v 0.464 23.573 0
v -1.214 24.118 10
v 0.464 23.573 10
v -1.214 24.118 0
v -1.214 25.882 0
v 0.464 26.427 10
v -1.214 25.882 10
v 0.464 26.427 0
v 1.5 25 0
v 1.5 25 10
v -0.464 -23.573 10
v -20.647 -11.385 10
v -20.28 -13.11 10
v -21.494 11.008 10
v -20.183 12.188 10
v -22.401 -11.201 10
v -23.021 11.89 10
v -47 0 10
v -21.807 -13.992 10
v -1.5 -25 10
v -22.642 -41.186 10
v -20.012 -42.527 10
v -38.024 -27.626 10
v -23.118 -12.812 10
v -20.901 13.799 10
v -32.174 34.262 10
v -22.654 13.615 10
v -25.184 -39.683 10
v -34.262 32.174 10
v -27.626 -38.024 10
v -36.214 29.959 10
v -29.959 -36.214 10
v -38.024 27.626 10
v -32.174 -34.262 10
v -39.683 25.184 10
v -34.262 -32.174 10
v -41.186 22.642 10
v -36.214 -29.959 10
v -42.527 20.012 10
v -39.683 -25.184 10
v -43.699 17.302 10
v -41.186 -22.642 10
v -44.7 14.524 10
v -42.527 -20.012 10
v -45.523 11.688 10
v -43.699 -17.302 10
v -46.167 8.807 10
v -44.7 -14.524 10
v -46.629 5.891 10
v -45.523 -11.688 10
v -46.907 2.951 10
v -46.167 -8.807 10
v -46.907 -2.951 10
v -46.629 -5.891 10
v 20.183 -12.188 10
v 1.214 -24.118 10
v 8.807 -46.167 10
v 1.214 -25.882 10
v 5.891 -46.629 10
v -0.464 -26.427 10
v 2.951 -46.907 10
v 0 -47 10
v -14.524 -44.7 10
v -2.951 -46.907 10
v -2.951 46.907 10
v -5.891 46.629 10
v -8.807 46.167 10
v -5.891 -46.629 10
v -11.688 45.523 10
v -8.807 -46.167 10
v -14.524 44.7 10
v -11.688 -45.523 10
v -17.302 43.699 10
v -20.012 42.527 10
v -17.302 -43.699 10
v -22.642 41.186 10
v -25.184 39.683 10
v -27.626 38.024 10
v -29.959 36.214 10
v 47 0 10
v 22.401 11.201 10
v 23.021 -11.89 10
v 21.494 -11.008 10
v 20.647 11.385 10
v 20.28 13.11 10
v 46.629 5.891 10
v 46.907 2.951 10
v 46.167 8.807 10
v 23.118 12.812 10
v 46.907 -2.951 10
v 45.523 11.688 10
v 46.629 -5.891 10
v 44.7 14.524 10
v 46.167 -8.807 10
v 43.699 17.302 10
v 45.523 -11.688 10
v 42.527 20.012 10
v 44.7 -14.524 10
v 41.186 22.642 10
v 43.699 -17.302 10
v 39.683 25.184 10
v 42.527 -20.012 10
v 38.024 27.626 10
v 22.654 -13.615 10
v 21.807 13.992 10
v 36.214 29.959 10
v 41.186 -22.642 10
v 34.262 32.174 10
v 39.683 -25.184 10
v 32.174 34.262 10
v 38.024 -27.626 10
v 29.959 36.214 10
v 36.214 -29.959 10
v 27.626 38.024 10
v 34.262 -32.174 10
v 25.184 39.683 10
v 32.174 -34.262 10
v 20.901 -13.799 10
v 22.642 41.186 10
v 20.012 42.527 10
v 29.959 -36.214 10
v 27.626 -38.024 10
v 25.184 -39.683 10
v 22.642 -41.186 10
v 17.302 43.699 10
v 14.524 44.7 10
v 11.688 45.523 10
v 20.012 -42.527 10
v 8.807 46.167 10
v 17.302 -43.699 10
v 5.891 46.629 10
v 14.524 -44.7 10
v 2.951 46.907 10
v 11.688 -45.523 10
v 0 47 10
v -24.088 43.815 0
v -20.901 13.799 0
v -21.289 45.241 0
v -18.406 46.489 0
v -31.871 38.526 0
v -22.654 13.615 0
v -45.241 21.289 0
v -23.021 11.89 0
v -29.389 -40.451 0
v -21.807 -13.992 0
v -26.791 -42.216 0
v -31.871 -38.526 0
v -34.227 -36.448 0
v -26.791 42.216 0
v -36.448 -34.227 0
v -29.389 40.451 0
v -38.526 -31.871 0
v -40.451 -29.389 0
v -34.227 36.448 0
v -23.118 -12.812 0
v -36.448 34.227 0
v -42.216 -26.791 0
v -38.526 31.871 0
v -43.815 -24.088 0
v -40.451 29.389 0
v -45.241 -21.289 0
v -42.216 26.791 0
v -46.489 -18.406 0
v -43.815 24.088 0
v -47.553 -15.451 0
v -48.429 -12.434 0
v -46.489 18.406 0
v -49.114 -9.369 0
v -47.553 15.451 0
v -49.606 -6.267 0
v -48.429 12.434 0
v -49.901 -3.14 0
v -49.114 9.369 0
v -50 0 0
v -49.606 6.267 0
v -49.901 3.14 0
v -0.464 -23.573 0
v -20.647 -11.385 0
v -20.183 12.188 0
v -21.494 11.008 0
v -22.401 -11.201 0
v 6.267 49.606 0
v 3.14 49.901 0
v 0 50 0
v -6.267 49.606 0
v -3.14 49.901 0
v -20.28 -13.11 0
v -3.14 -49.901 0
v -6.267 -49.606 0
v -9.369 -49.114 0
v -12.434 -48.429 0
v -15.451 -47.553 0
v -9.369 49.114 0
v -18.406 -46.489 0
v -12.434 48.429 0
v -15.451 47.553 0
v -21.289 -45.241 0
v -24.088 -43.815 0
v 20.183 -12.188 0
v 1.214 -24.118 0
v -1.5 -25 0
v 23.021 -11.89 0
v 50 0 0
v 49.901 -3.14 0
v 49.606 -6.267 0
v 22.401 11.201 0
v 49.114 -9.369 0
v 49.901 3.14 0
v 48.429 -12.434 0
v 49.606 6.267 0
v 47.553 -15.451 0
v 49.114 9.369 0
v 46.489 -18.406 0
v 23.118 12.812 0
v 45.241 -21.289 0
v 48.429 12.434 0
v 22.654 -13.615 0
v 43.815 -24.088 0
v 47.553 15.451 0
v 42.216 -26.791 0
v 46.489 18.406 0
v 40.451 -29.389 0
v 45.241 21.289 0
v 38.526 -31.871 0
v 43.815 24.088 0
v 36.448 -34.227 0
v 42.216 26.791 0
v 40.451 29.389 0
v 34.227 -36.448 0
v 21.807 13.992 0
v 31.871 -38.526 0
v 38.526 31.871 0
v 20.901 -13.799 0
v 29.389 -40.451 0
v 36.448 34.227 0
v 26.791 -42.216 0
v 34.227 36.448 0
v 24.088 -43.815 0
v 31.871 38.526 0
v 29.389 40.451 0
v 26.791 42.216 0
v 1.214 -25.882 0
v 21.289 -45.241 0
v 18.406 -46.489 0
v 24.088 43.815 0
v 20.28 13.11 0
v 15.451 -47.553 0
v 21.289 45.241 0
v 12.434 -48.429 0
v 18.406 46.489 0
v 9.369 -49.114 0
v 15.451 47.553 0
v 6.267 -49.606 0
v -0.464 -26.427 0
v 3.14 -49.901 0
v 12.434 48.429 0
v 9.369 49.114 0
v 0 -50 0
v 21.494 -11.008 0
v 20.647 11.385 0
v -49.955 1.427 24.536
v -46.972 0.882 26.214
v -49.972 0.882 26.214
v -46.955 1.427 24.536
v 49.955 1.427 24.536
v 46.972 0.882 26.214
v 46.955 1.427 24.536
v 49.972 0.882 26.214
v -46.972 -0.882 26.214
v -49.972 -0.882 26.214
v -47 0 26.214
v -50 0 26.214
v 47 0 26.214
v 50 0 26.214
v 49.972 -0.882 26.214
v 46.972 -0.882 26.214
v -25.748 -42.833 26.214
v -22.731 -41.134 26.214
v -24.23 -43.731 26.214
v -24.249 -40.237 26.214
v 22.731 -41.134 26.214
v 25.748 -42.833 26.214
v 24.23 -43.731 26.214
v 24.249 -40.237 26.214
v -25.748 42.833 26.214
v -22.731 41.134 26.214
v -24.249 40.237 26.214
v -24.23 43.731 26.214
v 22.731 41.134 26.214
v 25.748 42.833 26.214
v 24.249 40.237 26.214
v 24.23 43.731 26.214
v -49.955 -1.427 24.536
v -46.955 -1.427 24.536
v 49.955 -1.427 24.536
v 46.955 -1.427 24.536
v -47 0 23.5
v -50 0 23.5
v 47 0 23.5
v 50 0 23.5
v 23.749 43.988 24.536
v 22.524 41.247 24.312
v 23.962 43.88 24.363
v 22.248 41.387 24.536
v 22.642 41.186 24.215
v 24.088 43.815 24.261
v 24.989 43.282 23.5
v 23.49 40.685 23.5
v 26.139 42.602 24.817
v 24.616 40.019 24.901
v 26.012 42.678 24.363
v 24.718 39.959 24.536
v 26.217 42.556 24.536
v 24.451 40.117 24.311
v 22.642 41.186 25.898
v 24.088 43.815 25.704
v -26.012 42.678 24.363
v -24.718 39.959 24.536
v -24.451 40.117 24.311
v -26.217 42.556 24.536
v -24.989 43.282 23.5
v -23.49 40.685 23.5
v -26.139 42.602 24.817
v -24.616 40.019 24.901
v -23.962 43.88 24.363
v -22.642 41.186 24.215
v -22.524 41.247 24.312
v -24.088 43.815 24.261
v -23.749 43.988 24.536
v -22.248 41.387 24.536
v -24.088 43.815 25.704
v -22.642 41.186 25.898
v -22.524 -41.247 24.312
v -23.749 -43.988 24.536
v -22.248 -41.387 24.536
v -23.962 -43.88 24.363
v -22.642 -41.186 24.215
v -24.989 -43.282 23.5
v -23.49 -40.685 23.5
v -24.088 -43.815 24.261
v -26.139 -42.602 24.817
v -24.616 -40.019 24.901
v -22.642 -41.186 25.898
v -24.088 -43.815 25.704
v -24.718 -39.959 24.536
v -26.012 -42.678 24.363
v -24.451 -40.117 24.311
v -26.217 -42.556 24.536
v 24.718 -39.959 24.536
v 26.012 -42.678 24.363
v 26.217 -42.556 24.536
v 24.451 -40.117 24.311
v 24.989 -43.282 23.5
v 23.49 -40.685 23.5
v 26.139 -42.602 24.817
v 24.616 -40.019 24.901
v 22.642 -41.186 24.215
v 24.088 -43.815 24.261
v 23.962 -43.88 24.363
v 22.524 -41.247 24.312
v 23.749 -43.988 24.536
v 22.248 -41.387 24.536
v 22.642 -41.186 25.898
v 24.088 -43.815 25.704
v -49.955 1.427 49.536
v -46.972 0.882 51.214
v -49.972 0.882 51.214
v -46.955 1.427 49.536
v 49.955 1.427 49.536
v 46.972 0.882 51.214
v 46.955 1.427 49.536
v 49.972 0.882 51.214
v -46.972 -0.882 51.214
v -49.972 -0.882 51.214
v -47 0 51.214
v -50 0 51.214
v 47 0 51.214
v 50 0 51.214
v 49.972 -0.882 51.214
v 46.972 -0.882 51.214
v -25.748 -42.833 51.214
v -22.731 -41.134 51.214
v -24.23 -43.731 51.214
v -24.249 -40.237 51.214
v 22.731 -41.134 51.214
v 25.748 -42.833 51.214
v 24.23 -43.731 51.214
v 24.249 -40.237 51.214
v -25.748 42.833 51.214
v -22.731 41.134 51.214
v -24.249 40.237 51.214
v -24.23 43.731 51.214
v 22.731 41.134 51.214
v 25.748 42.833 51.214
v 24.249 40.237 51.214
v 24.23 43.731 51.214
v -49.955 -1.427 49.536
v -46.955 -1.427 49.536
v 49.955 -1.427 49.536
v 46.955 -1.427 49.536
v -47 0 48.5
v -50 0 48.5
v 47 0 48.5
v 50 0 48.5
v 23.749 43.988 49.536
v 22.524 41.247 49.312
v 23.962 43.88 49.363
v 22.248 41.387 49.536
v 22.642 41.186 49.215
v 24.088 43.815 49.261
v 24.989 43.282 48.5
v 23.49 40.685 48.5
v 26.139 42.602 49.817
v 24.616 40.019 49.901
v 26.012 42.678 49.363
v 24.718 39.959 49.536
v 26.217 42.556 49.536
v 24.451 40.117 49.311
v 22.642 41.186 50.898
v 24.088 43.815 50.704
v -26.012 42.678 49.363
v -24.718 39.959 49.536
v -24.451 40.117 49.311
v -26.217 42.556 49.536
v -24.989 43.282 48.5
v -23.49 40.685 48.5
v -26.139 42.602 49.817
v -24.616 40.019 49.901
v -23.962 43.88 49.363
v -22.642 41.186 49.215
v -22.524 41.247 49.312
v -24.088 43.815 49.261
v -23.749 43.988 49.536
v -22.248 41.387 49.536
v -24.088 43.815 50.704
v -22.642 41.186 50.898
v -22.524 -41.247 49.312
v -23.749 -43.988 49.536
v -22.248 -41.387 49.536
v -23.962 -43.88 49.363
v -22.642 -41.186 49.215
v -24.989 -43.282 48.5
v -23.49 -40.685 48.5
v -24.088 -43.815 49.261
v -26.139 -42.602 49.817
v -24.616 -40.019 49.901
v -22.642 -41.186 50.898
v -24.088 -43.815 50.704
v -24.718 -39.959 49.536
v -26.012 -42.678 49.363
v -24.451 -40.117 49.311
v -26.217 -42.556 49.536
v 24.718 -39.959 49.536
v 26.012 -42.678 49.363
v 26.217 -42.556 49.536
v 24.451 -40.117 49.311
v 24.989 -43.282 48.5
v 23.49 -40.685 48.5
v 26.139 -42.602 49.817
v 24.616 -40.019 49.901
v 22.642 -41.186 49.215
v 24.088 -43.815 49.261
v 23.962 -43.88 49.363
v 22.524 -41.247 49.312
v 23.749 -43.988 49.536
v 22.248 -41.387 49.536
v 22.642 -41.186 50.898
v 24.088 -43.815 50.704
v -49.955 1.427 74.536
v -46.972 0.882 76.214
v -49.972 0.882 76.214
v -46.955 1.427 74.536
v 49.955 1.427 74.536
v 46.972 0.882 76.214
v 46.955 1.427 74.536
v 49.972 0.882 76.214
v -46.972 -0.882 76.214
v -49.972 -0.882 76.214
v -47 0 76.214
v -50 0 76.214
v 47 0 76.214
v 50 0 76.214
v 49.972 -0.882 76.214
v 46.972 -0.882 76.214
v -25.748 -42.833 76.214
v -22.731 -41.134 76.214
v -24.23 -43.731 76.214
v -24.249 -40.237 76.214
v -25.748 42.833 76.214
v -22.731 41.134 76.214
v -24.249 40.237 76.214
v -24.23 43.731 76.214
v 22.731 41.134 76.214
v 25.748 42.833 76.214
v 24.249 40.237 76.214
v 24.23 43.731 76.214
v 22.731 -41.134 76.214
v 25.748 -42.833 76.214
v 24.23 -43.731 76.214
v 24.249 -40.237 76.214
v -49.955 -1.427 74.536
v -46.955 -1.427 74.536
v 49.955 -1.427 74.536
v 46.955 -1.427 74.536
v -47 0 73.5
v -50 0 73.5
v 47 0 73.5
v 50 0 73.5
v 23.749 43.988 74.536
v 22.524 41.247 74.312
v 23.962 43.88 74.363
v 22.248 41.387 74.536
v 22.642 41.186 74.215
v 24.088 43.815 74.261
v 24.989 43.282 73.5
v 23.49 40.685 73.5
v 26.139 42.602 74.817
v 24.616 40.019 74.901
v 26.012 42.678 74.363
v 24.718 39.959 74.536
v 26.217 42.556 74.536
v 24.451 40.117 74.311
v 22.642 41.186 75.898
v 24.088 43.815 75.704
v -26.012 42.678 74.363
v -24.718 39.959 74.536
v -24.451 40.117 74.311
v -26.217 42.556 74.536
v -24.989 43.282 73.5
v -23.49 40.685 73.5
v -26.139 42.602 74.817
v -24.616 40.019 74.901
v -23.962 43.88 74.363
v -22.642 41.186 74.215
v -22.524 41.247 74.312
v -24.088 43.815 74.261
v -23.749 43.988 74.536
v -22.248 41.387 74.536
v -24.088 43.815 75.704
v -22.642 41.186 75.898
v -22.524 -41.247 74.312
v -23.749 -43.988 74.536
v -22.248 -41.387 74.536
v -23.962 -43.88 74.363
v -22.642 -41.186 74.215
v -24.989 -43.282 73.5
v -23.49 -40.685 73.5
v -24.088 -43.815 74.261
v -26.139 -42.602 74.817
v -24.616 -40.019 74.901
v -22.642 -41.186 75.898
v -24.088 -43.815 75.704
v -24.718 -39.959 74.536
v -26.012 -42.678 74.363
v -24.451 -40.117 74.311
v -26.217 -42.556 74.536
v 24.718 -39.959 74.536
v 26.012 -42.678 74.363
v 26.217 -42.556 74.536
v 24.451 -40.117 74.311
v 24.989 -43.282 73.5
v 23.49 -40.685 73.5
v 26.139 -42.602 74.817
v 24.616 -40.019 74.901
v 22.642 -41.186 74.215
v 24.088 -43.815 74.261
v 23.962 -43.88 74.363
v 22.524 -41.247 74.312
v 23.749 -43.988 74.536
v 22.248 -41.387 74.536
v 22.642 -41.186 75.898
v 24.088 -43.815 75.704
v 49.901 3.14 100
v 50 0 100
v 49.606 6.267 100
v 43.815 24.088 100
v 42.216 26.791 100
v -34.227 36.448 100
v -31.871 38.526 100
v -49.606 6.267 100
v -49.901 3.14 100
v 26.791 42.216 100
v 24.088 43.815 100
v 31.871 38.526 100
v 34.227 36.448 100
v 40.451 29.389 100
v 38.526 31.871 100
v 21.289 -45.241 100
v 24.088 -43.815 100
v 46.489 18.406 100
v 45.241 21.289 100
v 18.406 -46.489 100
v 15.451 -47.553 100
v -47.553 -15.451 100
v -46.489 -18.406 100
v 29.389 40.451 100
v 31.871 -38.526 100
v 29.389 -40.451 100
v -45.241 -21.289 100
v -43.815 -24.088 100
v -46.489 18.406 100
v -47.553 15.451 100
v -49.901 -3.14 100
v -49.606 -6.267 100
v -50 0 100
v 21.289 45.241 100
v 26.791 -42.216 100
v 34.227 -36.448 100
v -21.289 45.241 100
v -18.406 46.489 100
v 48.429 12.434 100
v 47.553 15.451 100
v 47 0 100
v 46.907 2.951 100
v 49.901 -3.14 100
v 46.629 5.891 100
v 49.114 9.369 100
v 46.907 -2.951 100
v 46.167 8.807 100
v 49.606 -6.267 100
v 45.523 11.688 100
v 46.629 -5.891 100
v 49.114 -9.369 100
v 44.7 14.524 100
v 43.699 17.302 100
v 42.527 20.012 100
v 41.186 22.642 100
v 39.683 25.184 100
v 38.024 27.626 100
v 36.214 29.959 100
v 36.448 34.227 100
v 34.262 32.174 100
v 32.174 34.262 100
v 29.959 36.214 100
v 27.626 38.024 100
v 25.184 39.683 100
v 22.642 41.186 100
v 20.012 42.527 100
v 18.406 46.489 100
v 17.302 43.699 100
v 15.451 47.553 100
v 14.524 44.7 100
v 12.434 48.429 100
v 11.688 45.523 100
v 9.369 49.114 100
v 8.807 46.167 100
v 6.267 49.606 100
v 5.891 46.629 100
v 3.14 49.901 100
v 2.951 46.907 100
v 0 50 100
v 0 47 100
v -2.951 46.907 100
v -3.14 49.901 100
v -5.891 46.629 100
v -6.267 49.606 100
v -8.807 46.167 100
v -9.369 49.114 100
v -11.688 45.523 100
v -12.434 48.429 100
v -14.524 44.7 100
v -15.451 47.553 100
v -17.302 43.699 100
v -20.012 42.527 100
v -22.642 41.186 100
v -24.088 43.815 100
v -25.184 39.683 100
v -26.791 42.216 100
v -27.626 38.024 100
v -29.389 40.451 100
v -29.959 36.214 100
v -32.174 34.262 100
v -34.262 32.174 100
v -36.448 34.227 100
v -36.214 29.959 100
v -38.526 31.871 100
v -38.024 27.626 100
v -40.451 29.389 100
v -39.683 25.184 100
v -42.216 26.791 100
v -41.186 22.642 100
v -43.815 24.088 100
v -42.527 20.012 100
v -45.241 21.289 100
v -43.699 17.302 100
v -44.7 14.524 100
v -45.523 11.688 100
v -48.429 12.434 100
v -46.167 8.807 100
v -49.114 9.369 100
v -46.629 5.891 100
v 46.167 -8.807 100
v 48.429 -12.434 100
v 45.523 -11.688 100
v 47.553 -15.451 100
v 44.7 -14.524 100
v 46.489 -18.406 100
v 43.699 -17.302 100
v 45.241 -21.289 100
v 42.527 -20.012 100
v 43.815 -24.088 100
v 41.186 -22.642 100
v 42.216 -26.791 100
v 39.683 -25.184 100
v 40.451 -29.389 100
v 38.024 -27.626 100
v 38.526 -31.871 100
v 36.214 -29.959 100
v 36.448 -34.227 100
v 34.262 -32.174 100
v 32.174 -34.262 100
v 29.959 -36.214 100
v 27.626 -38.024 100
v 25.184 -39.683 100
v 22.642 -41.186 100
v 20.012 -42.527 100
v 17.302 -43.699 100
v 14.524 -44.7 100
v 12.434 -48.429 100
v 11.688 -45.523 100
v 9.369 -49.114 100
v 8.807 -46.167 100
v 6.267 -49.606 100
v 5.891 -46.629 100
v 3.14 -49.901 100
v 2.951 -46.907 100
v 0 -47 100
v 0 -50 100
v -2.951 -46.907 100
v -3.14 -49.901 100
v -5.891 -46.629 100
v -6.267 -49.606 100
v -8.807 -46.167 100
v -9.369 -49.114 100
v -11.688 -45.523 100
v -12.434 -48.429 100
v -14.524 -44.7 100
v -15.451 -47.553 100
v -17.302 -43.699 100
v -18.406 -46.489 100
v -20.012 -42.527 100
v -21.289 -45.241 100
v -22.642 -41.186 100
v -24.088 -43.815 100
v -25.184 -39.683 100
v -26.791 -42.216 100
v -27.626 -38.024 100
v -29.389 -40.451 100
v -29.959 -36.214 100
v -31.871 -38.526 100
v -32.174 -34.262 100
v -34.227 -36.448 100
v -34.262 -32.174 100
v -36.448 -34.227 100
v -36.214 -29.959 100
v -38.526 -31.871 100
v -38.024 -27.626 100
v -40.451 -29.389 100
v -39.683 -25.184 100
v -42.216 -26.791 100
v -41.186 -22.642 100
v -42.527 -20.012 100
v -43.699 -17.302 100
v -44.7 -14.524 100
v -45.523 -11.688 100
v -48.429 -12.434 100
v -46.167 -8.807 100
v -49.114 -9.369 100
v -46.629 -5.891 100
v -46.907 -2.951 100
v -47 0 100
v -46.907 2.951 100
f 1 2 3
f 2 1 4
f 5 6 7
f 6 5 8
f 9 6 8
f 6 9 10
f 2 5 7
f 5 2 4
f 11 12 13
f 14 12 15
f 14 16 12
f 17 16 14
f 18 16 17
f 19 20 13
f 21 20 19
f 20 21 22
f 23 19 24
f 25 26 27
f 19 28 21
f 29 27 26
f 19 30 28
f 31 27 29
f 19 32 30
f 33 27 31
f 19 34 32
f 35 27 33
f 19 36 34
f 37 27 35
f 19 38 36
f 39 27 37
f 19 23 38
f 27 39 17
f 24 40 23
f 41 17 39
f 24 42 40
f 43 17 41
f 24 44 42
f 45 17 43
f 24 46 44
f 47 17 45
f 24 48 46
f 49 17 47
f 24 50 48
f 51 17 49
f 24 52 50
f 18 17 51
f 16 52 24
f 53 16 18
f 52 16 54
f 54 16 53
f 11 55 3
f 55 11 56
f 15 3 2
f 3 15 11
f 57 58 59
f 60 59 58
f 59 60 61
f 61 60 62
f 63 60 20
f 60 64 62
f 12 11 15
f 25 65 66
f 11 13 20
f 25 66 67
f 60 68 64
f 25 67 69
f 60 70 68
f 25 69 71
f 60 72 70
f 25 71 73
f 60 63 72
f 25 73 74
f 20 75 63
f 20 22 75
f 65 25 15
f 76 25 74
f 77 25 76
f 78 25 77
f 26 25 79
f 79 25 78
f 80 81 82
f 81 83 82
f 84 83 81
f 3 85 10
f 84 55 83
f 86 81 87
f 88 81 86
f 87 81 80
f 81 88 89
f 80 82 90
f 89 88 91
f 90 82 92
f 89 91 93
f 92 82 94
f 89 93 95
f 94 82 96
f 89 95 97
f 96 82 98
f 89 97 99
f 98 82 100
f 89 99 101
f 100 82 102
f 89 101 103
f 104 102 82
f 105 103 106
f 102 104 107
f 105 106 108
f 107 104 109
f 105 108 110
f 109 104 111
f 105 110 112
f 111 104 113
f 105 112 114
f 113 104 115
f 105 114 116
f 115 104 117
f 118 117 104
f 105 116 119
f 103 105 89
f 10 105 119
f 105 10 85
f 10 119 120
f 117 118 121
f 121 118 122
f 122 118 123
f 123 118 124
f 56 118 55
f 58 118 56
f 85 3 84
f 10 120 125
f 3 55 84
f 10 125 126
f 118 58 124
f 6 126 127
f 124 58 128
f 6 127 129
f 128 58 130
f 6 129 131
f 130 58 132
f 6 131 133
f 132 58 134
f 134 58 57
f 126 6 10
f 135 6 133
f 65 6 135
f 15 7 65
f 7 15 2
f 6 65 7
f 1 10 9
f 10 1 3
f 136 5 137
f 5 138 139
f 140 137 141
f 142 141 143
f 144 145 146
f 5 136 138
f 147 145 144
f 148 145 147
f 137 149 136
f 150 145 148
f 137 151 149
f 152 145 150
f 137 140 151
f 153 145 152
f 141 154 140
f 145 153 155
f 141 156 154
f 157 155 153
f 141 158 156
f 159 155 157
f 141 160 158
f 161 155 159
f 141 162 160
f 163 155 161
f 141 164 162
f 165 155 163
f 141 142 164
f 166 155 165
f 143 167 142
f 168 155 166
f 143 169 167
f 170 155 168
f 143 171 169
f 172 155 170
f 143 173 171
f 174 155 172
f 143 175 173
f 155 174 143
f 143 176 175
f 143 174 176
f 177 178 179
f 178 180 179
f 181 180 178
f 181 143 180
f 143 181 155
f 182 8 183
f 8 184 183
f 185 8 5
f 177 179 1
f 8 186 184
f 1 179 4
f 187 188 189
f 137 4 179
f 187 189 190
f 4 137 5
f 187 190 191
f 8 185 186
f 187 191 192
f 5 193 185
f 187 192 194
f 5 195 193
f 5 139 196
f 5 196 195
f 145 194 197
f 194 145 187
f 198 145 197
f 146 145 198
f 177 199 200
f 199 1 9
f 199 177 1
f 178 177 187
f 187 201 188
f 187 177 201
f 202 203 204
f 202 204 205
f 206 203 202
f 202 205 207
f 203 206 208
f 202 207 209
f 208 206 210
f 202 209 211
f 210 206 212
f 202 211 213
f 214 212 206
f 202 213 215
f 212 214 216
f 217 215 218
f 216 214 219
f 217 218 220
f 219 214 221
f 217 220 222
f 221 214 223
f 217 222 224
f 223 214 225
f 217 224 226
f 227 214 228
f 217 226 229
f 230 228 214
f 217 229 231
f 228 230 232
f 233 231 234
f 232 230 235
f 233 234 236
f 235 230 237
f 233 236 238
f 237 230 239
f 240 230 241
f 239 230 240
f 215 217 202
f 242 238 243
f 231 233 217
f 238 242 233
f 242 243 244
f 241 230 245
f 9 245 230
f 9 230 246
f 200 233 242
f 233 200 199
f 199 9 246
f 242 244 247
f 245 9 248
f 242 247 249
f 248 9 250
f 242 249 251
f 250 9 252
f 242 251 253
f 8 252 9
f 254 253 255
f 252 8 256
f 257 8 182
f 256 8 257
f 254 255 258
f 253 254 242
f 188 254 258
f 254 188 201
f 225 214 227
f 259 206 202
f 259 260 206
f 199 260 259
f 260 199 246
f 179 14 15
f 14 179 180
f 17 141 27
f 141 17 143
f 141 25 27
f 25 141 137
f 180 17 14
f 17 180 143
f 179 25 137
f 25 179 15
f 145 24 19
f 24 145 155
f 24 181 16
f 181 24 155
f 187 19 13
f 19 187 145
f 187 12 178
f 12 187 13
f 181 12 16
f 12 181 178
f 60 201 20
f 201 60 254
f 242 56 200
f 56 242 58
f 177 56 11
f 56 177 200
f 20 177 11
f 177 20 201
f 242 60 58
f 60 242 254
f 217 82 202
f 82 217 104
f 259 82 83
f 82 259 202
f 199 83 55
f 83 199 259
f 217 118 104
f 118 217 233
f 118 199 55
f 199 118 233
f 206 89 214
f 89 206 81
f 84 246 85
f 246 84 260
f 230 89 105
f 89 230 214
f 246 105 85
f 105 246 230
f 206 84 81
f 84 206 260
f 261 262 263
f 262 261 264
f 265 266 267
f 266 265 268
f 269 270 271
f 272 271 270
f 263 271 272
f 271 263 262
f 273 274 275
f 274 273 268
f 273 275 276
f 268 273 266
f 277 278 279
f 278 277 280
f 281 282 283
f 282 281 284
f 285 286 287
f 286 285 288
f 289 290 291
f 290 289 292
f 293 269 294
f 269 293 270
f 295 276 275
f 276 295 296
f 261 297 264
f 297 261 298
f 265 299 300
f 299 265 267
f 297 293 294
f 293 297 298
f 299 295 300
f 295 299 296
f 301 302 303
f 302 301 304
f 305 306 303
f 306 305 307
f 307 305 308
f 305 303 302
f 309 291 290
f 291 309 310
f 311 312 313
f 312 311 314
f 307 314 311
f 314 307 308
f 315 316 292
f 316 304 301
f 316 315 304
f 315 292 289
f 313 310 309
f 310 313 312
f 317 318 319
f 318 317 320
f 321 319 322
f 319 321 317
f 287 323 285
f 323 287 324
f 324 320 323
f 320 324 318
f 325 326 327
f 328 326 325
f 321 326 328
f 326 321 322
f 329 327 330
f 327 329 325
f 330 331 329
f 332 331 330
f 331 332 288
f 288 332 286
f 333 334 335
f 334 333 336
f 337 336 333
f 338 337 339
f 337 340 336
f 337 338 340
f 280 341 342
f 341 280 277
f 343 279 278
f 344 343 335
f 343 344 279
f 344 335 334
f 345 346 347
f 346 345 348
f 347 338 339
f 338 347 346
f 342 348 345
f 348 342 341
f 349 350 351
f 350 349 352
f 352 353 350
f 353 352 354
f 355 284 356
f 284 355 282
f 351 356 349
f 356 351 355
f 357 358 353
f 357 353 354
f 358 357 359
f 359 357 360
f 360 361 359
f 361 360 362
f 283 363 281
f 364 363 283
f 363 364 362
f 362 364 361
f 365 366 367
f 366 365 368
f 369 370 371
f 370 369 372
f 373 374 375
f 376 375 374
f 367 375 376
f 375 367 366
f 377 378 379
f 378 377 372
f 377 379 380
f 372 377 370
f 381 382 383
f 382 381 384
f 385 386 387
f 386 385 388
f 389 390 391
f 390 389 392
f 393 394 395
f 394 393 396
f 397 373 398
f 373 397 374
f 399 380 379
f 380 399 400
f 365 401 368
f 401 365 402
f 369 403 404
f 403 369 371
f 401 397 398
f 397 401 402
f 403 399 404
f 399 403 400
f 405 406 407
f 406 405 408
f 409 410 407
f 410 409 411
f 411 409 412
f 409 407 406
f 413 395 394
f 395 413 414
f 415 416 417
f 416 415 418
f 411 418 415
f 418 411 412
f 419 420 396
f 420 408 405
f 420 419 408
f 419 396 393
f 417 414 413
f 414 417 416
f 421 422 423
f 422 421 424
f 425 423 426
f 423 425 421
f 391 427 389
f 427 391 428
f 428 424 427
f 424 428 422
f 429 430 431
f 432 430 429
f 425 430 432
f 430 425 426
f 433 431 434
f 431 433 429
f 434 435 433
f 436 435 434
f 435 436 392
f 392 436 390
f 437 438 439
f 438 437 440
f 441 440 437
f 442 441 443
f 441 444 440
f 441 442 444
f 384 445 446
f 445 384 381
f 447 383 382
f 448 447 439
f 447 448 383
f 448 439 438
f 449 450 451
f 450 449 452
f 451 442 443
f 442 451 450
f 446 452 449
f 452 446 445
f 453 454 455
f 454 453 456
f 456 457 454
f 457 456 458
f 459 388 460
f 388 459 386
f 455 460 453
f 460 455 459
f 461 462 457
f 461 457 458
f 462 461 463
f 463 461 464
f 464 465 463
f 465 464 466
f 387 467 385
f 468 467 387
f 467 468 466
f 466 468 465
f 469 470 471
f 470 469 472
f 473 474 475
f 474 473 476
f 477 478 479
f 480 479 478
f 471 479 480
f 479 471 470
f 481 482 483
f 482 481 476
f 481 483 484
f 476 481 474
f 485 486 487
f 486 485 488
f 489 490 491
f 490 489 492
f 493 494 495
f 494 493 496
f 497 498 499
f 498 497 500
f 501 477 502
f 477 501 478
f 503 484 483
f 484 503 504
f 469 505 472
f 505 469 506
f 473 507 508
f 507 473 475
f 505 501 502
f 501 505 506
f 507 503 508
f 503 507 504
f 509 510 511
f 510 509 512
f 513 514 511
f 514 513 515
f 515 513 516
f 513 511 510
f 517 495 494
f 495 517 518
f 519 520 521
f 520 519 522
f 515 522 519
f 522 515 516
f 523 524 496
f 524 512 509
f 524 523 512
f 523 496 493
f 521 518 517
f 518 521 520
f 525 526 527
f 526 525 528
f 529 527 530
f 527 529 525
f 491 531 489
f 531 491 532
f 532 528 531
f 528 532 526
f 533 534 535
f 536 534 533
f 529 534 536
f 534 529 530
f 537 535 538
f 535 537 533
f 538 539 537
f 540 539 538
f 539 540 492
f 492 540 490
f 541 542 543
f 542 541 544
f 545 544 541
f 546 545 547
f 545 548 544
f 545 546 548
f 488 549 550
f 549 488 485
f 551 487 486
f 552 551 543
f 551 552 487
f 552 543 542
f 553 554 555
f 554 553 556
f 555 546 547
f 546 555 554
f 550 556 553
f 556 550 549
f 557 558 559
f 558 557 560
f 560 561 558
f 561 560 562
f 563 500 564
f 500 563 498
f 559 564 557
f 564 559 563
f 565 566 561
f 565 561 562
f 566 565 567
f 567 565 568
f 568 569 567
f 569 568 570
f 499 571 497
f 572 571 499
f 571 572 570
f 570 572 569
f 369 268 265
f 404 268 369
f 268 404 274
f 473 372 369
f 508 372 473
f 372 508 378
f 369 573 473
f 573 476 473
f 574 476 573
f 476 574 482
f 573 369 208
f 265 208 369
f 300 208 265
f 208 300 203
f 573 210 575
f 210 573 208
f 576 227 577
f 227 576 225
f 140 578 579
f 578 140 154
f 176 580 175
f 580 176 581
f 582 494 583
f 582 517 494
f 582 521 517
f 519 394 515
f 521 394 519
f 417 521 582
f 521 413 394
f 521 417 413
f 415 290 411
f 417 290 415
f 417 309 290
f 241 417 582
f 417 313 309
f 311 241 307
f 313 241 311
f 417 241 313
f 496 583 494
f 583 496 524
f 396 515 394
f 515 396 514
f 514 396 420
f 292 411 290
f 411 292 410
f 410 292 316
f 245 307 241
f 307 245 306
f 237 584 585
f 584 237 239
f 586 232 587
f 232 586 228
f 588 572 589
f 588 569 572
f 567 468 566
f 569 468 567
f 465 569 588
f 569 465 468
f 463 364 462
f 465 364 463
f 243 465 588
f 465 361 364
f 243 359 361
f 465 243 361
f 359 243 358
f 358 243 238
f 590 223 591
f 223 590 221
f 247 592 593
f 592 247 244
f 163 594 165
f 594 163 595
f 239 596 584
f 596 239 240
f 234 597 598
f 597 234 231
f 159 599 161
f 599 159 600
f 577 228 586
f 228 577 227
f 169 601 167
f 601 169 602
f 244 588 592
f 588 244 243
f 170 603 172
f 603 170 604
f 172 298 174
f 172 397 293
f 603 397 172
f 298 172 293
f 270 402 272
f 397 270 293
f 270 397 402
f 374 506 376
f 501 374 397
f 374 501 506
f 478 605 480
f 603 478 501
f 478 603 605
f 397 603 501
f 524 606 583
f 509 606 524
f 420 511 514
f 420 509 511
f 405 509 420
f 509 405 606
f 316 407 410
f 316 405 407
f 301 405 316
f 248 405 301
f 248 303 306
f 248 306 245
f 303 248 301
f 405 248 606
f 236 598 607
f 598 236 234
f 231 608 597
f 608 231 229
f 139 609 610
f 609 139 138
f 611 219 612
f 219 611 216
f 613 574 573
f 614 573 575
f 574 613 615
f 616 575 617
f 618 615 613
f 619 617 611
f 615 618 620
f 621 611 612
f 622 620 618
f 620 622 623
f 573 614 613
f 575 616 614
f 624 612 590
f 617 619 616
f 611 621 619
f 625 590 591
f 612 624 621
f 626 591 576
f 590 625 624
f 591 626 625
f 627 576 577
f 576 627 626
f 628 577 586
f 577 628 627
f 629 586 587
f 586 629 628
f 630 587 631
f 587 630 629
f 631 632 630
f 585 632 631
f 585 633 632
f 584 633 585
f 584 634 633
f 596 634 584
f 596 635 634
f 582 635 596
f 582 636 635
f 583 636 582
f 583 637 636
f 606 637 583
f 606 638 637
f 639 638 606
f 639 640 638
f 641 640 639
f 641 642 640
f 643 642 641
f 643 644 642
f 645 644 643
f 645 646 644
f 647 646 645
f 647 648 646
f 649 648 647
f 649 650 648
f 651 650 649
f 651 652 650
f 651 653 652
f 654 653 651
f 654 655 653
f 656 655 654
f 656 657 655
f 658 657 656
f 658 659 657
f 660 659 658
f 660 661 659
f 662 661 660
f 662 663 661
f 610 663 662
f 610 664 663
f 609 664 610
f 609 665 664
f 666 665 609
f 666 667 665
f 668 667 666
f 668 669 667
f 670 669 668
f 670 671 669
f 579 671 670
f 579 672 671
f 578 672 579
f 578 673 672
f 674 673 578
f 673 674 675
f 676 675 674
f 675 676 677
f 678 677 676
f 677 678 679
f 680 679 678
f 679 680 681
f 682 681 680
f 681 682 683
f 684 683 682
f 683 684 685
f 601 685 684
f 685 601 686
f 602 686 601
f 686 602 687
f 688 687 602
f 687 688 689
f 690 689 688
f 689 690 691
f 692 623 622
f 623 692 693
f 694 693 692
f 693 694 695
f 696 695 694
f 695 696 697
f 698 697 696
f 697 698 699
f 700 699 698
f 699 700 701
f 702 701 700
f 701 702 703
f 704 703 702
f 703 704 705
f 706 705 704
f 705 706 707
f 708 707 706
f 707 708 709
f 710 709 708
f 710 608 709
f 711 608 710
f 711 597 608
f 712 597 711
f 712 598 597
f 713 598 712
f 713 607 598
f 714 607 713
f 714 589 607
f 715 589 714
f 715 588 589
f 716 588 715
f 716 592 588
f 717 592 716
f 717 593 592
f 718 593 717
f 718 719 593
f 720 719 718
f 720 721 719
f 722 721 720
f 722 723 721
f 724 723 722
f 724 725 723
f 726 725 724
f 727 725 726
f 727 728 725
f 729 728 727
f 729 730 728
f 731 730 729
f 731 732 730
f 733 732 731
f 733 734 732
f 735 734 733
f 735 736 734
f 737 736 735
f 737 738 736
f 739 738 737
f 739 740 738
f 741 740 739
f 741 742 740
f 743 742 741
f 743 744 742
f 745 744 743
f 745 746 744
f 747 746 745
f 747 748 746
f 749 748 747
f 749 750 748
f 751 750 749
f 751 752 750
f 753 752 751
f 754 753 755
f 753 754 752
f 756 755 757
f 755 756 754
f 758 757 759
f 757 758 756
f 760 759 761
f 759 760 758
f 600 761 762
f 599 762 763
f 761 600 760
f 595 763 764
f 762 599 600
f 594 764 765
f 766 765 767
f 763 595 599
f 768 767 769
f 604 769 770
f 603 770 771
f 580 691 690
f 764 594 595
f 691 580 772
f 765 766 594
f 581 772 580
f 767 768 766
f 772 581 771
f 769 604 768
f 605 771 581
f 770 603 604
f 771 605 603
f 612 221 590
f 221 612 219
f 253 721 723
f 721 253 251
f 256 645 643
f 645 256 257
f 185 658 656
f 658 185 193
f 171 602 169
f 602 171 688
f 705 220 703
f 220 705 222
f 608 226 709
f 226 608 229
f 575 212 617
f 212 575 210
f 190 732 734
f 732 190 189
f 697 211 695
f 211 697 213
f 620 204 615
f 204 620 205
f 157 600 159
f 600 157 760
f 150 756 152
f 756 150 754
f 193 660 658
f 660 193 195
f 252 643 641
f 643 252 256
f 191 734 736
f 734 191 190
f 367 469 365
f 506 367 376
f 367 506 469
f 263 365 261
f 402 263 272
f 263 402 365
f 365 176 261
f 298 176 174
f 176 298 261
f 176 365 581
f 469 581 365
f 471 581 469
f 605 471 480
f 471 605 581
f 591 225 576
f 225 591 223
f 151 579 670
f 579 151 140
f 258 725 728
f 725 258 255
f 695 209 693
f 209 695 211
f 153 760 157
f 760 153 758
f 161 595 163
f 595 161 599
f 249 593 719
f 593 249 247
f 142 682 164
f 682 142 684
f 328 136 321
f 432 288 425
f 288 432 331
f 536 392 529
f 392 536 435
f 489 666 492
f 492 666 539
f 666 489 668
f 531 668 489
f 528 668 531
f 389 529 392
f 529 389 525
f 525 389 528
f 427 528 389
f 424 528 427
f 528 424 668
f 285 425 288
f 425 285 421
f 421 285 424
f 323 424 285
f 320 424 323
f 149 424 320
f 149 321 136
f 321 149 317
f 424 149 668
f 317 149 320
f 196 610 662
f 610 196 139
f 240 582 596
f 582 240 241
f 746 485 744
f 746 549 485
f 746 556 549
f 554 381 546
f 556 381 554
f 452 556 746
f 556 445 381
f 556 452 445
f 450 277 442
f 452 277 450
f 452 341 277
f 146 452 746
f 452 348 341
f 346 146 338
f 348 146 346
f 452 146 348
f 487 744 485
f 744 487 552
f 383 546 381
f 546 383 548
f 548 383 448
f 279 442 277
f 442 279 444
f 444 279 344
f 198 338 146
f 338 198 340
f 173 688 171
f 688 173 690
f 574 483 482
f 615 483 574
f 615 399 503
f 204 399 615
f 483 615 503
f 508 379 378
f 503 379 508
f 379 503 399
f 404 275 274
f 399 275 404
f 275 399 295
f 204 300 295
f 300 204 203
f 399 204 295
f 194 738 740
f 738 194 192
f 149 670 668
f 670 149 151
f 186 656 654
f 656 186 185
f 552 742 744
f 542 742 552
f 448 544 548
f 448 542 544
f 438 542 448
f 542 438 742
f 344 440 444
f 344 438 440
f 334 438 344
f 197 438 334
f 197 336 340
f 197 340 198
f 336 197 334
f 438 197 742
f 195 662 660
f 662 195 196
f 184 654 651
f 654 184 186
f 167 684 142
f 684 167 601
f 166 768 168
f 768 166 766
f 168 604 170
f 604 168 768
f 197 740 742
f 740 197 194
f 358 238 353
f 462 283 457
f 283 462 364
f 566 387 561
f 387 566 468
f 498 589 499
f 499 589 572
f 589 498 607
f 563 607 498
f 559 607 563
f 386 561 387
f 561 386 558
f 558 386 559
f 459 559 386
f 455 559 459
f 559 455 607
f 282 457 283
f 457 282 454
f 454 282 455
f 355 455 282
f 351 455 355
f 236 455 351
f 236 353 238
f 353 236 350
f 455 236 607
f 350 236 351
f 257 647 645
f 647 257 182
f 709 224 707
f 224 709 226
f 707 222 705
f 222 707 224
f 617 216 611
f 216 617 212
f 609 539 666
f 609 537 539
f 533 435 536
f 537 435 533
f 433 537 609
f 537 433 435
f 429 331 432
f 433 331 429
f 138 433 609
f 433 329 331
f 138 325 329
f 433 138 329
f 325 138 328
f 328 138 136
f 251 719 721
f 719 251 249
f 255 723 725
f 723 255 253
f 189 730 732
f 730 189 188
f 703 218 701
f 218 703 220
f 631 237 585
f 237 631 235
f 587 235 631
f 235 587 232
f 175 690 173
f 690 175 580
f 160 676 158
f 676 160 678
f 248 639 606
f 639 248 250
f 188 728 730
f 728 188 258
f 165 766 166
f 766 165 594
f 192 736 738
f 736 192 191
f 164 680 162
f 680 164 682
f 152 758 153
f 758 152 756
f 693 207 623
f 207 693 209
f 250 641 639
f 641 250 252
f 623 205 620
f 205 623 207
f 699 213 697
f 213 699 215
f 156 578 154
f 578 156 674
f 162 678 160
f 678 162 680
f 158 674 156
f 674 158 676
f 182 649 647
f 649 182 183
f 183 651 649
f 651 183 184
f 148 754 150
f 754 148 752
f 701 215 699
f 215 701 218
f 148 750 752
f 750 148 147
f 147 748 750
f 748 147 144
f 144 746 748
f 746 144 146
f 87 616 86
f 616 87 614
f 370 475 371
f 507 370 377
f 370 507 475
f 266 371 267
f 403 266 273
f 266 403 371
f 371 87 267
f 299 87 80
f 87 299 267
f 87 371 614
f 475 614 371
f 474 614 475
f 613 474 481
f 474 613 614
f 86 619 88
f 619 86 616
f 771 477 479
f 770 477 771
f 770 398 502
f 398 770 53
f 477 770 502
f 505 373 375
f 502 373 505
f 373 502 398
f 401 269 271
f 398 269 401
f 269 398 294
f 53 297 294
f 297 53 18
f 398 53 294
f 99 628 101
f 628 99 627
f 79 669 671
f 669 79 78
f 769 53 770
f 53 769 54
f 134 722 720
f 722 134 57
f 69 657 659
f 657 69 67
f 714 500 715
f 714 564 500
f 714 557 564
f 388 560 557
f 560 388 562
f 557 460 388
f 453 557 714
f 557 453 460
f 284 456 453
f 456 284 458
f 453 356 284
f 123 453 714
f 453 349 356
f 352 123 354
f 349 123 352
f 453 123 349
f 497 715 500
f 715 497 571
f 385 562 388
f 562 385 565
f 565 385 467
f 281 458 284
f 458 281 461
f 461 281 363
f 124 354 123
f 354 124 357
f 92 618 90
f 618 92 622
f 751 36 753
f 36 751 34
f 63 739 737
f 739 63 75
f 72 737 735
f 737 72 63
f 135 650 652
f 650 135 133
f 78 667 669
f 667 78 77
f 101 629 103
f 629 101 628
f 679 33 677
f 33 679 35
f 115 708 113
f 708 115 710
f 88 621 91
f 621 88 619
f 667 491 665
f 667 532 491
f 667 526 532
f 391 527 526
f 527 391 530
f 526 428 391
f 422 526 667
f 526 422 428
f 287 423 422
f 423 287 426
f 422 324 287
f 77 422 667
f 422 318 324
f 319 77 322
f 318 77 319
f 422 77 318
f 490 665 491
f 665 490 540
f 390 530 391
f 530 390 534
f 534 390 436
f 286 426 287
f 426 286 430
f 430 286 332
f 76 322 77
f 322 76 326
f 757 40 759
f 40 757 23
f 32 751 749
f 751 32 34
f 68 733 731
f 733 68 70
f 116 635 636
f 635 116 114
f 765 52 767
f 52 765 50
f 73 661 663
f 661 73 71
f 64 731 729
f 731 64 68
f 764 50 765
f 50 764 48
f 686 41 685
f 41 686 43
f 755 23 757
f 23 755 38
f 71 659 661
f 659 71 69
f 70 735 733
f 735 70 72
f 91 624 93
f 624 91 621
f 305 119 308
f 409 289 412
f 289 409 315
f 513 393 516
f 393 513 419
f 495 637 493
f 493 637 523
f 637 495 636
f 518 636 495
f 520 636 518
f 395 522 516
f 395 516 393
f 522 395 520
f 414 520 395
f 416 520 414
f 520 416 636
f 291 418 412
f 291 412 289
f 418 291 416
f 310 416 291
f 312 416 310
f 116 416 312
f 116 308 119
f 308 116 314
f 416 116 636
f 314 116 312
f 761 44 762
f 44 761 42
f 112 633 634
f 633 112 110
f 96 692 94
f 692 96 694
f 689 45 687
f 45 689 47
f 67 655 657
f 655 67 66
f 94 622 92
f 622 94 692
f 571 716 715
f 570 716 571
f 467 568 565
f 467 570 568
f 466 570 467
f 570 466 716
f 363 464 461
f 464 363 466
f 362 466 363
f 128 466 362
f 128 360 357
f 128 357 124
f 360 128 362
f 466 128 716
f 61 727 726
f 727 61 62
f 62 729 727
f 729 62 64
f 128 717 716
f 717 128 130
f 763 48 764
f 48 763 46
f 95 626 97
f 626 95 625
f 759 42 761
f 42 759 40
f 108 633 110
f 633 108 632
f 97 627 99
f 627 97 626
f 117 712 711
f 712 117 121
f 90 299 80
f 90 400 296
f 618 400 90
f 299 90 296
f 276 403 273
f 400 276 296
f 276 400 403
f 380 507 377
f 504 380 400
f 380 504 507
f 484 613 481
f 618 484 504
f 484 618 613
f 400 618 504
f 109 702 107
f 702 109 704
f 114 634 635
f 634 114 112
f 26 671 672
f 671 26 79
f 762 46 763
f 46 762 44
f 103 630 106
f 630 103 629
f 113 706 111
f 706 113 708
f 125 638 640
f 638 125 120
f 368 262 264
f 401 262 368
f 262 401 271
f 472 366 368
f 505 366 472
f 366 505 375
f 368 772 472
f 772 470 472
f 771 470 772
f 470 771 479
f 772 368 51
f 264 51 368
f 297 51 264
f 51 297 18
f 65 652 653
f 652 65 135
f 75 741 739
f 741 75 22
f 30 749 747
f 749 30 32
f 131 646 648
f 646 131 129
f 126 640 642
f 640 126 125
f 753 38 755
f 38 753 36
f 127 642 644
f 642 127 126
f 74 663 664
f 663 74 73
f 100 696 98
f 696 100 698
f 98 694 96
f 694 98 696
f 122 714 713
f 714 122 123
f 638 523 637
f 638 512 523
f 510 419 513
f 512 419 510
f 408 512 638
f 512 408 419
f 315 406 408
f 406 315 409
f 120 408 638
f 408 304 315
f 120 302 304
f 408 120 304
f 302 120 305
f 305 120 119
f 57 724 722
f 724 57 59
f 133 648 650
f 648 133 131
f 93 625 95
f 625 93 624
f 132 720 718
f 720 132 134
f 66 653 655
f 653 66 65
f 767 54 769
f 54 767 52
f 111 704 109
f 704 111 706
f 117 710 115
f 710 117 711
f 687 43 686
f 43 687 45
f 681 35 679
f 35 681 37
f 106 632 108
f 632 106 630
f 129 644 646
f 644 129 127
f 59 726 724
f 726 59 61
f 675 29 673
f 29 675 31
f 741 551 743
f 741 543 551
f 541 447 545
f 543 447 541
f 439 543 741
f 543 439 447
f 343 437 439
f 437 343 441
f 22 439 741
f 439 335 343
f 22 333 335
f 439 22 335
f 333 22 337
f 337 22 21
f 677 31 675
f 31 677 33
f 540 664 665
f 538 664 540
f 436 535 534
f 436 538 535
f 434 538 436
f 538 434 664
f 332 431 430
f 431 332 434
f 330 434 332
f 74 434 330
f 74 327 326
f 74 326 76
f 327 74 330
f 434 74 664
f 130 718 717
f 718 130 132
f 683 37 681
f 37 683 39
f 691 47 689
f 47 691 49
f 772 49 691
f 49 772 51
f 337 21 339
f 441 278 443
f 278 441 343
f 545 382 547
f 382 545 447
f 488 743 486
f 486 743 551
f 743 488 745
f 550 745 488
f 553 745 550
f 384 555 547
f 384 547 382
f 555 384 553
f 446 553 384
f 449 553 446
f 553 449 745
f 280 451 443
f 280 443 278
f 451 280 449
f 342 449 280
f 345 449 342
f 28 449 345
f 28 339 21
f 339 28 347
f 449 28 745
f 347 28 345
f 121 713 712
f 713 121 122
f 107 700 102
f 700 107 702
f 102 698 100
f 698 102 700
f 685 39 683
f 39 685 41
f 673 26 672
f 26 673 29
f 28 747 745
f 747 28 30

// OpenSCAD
// [FL_INDEX: keywords="openscad, 3d_parametric, Parametric_Cheese_Mold, csg_solid" | COT="Parametric OpenSCAD design from 3DCodeverse"]
// Title: Parametric Cheese Mold

//Variable Description

MoldRadius=50; // Possible Values
MoldHeight=100; // Possible Values
HoleR=1.5; // Possible Values
Wall=(MoldRadius-3);

difference() {
	cylinder(r=MoldRadius, h=MoldHeight, $fn=100);
		translate([0, 0, 10])
		cylinder(r=Wall, h=MoldHeight, $fn=100);
		
//Bottom Holes
		for ( i = [0 : 5] )
			{
    				rotate( i * 360 / 6, [0, 0, 1])
    				translate([0, MoldRadius/2, 0])
    				cylinder(r = HoleR, h=10);
			}
// Side Holes

for ( z = [0 : 2] )

	{		
		for ( i = [0 : 5] )
			{
    				rotate( i * 360 / 6, [0, 0, 1])
    				translate([0, 0, MoldHeight/4 * (z+1)])
				rotate([0,90,0])
    				cylinder(r = HoleR, h=MoldRadius+10);
			}

		}
 	}
